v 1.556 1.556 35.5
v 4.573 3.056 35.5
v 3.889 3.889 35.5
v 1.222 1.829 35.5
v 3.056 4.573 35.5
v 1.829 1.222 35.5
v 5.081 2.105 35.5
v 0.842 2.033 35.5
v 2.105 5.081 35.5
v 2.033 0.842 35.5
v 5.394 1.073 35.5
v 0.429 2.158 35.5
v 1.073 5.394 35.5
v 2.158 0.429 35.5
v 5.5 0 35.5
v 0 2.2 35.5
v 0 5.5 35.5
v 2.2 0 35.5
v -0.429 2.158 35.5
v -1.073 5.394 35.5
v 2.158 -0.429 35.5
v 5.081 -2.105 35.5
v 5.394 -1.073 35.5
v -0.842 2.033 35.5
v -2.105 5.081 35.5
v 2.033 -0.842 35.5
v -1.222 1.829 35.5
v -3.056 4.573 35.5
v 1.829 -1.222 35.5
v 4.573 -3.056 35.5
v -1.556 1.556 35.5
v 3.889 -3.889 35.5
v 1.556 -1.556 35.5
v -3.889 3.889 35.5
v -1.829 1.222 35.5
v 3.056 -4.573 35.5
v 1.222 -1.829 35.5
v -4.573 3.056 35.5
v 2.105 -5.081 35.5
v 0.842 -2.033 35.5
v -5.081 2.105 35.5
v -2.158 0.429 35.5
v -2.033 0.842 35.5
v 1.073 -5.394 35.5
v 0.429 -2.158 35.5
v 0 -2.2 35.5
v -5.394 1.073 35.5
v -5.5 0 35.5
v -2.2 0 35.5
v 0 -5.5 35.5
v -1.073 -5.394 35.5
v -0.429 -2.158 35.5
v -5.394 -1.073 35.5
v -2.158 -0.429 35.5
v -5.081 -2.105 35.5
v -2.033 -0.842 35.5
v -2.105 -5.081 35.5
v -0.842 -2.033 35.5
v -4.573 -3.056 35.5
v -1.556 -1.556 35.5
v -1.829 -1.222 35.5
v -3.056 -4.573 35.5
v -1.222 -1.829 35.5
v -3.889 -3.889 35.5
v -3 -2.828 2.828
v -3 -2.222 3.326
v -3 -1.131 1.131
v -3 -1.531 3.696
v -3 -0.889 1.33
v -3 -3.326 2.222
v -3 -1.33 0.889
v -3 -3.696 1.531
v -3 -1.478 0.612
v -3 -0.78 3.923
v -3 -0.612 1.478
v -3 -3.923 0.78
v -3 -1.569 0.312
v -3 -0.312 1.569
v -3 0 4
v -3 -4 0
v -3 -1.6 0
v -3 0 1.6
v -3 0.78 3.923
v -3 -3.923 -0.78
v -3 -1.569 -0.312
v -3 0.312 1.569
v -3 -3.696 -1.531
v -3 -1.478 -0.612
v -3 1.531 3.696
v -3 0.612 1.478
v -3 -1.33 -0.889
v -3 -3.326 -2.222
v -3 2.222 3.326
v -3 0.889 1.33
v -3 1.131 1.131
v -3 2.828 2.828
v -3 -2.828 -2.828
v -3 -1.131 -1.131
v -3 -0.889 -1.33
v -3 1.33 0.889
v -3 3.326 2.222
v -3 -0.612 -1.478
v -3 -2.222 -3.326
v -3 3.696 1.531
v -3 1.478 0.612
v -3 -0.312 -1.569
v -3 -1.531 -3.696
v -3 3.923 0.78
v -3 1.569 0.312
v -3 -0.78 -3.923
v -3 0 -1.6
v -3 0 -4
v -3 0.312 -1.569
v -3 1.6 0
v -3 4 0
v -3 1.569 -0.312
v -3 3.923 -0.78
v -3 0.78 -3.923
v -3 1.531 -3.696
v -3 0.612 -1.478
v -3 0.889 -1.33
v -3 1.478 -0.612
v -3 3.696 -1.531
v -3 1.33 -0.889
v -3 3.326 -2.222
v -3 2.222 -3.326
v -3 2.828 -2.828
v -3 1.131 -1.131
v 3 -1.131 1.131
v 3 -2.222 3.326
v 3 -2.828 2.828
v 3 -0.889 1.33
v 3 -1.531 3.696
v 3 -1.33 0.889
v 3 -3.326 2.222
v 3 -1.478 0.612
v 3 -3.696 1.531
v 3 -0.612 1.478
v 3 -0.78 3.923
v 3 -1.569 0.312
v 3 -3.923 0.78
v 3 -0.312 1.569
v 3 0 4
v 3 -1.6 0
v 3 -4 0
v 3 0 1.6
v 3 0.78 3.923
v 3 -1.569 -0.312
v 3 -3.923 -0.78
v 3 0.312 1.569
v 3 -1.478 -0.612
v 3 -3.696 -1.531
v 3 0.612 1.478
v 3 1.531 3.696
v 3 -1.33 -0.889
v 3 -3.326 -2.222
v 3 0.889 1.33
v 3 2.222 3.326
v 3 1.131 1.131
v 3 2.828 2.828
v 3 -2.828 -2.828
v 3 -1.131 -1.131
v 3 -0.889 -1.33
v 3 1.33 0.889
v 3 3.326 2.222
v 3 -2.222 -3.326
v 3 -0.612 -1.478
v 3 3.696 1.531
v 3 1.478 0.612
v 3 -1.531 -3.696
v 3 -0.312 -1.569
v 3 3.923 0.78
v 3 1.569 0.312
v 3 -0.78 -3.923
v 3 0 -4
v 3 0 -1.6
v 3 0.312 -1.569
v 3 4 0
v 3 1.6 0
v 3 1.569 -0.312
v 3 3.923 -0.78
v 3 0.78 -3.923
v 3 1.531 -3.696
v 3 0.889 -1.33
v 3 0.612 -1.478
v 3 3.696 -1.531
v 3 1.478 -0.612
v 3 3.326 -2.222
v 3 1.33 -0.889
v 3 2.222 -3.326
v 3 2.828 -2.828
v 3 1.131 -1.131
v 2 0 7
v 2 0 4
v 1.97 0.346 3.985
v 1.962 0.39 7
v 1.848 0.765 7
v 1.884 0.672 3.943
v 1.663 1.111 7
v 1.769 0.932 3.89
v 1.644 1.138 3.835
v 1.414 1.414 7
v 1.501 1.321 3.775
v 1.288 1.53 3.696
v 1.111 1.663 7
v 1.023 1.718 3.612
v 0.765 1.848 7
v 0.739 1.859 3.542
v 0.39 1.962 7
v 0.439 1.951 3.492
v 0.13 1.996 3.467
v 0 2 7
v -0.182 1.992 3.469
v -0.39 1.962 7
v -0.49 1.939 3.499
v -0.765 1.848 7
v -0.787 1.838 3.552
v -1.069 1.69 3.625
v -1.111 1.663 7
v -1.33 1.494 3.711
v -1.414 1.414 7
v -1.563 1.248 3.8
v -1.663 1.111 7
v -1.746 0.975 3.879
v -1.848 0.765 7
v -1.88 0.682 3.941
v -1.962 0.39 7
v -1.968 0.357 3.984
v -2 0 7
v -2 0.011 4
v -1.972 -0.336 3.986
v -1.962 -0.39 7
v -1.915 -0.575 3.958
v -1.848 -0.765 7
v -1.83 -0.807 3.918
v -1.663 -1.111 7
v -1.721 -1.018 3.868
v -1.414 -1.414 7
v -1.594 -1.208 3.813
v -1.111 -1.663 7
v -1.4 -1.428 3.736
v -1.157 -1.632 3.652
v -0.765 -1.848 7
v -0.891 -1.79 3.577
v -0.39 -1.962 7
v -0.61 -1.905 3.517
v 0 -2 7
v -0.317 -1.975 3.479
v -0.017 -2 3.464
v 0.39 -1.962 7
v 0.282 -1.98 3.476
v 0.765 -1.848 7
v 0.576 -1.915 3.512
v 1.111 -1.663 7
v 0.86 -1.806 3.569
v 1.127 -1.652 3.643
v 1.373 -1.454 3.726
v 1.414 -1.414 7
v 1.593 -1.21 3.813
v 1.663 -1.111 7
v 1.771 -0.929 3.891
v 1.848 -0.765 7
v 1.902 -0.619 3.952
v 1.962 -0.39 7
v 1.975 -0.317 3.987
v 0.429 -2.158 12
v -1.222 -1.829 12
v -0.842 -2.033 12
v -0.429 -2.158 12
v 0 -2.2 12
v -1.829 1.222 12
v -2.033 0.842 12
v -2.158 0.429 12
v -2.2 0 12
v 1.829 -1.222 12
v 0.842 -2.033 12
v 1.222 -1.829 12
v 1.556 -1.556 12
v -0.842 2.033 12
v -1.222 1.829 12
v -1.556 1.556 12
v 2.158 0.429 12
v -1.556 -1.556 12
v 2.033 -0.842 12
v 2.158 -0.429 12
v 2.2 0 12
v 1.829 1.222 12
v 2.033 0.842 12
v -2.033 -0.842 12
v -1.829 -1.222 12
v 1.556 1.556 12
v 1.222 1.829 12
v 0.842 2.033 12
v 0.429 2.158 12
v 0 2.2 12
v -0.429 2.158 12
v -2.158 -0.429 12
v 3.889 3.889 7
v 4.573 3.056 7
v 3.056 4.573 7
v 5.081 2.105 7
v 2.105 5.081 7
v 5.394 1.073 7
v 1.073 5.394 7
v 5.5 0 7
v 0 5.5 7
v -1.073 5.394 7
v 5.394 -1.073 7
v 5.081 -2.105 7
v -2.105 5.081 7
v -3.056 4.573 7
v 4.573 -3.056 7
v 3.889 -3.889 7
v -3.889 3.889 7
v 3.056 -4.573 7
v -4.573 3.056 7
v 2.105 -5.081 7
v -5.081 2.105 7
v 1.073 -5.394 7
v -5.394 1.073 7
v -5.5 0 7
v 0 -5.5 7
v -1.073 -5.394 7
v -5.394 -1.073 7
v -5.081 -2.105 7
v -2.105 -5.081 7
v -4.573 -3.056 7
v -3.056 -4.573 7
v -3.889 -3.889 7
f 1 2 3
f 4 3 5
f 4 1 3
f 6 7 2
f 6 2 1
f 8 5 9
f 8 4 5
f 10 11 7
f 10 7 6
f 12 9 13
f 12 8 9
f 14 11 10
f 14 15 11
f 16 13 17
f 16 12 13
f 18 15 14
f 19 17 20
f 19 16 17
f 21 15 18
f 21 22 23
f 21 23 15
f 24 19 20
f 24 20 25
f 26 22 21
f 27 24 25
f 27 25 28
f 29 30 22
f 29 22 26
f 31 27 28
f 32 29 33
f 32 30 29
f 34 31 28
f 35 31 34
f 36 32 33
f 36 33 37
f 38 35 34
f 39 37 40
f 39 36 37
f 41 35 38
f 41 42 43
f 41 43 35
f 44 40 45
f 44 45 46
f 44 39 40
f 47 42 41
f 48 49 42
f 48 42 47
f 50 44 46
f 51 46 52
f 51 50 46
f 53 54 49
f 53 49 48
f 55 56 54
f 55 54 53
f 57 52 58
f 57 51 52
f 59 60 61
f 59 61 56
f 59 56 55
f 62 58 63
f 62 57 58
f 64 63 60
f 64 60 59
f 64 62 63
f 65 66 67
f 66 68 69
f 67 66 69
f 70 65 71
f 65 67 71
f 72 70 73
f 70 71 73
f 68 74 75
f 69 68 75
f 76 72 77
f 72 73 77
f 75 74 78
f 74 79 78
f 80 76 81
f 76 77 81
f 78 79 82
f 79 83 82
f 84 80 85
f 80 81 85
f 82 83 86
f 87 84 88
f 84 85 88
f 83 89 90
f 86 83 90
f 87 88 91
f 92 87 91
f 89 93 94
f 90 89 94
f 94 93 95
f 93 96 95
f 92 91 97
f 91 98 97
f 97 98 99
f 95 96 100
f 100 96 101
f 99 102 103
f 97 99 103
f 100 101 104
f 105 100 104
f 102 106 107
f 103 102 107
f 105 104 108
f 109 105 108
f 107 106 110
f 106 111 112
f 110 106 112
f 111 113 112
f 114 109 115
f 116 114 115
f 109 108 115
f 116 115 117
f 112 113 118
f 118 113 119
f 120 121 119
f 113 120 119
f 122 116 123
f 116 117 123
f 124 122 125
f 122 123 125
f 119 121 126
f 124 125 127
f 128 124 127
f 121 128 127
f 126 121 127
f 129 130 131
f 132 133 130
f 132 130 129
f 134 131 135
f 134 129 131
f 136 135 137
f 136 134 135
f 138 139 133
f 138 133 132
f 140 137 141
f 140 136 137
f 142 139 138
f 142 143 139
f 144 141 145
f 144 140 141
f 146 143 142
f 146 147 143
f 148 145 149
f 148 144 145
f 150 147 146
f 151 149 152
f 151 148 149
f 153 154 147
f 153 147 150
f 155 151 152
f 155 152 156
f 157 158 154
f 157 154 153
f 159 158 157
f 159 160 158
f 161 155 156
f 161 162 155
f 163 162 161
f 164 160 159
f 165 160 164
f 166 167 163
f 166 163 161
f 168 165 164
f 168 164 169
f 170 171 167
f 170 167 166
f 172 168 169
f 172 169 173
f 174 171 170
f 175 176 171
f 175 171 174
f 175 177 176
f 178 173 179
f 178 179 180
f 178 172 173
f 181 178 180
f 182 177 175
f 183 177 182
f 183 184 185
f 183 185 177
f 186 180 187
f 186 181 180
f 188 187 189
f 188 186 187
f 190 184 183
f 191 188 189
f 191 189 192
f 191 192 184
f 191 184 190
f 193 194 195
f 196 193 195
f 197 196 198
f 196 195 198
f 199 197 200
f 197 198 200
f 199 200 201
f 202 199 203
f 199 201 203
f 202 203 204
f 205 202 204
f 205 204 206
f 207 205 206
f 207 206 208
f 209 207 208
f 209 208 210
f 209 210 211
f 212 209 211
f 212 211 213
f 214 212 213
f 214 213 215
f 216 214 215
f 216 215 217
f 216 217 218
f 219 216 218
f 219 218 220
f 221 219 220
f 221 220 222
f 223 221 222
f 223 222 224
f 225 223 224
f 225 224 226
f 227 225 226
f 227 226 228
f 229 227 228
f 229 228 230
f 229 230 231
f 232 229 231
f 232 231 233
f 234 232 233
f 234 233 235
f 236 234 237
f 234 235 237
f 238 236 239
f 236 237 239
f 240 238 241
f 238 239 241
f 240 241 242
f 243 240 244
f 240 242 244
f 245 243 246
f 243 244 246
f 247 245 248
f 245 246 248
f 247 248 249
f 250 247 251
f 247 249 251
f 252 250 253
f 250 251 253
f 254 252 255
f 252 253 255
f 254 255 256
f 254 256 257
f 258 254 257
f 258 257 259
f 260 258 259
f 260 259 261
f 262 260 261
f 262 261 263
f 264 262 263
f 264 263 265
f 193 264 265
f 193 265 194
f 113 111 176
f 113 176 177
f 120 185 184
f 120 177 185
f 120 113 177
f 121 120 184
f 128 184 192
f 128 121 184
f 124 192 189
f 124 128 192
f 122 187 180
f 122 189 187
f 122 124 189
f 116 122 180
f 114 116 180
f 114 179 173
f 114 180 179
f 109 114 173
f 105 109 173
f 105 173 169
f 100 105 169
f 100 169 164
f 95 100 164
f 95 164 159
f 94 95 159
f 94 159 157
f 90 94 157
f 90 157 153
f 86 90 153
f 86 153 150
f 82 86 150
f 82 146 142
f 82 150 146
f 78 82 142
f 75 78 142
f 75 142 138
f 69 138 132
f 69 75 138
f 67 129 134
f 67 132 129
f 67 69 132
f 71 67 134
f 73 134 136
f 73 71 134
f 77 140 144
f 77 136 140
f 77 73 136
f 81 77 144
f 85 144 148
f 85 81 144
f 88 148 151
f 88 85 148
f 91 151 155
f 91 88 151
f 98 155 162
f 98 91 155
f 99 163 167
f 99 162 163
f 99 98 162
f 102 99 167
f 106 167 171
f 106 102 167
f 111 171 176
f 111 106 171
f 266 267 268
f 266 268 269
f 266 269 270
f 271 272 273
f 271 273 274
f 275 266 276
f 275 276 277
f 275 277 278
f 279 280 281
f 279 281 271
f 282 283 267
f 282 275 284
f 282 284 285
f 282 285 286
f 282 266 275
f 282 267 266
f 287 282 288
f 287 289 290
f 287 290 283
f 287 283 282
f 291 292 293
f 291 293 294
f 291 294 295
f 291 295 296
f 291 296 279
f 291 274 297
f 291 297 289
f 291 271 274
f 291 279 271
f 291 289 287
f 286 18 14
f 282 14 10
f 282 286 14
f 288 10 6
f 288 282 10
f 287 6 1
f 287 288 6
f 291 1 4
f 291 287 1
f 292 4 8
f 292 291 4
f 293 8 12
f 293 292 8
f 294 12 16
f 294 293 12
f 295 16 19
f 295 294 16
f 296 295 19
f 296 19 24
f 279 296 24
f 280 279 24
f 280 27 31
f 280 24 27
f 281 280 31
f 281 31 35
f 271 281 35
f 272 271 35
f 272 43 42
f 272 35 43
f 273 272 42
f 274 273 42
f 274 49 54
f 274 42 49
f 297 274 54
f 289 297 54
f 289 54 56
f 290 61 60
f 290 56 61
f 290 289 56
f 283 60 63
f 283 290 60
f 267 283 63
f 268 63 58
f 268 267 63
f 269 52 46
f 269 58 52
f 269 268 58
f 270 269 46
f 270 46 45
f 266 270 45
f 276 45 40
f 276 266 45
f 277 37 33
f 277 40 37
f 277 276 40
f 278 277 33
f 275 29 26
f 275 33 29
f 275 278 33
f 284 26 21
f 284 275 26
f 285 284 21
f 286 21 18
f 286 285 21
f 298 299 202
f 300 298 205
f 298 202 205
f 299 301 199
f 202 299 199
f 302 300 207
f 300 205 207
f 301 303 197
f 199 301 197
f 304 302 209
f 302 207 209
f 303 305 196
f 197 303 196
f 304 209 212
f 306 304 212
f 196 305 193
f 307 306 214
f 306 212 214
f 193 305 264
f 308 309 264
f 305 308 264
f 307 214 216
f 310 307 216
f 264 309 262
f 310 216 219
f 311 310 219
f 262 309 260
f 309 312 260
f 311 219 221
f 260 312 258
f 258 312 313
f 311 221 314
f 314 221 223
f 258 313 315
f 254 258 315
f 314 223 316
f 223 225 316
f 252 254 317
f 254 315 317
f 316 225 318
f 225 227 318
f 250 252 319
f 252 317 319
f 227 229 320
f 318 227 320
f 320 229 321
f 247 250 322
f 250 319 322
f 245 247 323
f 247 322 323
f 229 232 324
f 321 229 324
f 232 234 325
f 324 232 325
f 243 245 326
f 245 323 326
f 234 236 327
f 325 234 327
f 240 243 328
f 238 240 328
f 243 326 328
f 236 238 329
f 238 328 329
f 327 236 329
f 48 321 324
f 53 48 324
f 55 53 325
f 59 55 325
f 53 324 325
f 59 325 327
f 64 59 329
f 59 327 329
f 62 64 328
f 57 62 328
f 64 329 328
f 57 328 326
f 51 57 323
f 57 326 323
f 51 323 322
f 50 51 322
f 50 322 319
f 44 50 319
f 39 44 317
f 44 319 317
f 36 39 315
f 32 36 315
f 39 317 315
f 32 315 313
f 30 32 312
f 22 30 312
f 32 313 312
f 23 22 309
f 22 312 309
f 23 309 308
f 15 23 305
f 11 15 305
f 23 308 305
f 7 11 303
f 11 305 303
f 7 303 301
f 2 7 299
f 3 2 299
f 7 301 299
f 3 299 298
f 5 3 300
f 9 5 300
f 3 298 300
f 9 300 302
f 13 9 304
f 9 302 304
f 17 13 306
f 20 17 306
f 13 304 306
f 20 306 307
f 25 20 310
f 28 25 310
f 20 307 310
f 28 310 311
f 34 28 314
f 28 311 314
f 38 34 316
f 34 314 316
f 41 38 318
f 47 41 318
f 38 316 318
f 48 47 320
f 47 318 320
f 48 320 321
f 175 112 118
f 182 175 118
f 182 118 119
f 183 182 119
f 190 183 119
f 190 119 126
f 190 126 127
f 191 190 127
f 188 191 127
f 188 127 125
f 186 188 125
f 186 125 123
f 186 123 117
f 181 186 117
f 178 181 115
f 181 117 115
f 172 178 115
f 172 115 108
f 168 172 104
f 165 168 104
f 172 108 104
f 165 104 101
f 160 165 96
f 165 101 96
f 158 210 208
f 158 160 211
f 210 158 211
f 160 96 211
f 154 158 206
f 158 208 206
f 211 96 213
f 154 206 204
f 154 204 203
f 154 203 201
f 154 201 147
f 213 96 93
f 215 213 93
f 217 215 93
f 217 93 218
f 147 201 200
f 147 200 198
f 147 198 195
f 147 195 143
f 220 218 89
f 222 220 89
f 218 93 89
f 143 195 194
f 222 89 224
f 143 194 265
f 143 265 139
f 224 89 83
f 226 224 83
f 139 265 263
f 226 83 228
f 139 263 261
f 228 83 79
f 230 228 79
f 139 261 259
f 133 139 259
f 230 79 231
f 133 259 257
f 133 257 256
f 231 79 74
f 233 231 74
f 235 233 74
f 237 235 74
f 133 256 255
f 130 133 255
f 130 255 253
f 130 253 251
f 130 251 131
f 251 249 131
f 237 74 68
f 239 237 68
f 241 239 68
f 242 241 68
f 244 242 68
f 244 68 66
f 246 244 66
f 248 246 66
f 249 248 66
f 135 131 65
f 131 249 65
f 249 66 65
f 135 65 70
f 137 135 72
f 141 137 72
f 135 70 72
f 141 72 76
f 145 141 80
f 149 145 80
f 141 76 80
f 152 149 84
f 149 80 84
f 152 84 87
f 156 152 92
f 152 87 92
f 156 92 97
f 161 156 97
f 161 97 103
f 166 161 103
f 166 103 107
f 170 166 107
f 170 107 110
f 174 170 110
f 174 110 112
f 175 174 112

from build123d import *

# Parameters (mm, degrees)
F_0000_CYLINDER_SKETCH_R     = 5.5
F_0000_CYLINDER_DEPTH        = 28.5
F_0002_CYLINDER_SKETCH_R     = 2.2
F_0002_CYLINDER_DEPTH        = 24.5
F_0005_CYLINDER_SKETCH_R     = 2
F_0005_CYLINDER_DEPTH        = 6
F_0008_CYLINDER_SKETCH_R     = 4
F_0008_CYLINDER_DEPTH        = 6
F_0008_CYLINDER_ROTATE_ANGLE = 90
F_0010_CYLINDER_SKETCH_R     = 1.6
F_0010_CYLINDER_DEPTH        = 8
F_0010_CYLINDER_ROTATE_ANGLE = 90


with BuildPart() as part:
    # 0000_cylinder_Sketch → 0000_cylinder (new body)
    with BuildSketch(Plane.XY):
        with Locations(Location((0, 0, 0), (0, 0, 180))):
            Circle(F_0000_CYLINDER_SKETCH_R)
    extrude(amount=F_0000_CYLINDER_DEPTH)


with BuildPart() as part_1:
    # 0000_cylinder_Translate: moved
    add(part.part.moved(Location((0, 0, 7))))


with BuildPart() as body_2:
    # 0002_cylinder_Sketch → 0002_cylinder (new body)
    with BuildSketch(Plane.XY):
        Circle(F_0002_CYLINDER_SKETCH_R)
    extrude(amount=F_0002_CYLINDER_DEPTH)


with BuildPart() as body_2_1:
    # 0002_cylinder_Translate: moved
    add(body_2.part.moved(Location((0, 0, 12))))


with BuildPart() as part_2:
    add(part_1.part)

    # 0004_sub: cut body 2
    add(body_2_1.part, mode=Mode.SUBTRACT)


with BuildPart() as body_2_2:
    # 0005_cylinder_Sketch → 0005_cylinder (new body)
    with BuildSketch(Plane.XY):
        Circle(F_0005_CYLINDER_SKETCH_R)
    extrude(amount=F_0005_CYLINDER_DEPTH)


with BuildPart() as body_2_2_1:
    # 0005_cylinder_Translate: moved
    add(body_2_2.part.moved(Location((0, 0, 3))))


with BuildPart() as part_3:
    add(part_2.part)

    # 0007_add: union body 2 2
    add(body_2_2_1.part)


with BuildPart() as body_2_3:
    # 0008_cylinder_Sketch → 0008_cylinder (new body)
    with BuildSketch(Plane.XY):
        Circle(F_0008_CYLINDER_SKETCH_R)
    extrude(amount=F_0008_CYLINDER_DEPTH)


with BuildPart() as body_2_3_1:
    # 0008_cylinder_Rotate: moved
    add(body_2_3.part.rotate(Axis((0, 0, 0), (0, 1, 0)), F_0008_CYLINDER_ROTATE_ANGLE))


with BuildPart() as body_2_3_2:
    # 0008_cylinder_Translate: moved
    add(body_2_3_1.part.moved(Location((-3, 0, 0))))


with BuildPart() as part_4:
    add(part_3.part)

    # 0009_add: union body 2 3
    add(body_2_3_2.part)


with BuildPart() as body_2_4:
    # 0010_cylinder_Sketch → 0010_cylinder (new body)
    with BuildSketch(Plane.XY):
        Circle(F_0010_CYLINDER_SKETCH_R)
    extrude(amount=F_0010_CYLINDER_DEPTH)


with BuildPart() as body_2_4_1:
    # 0010_cylinder_Rotate: moved
    add(body_2_4.part.rotate(Axis((0, 0, 0), (0, 1, 0)), F_0010_CYLINDER_ROTATE_ANGLE))


with BuildPart() as body_2_4_2:
    # 0010_cylinder_Translate: moved
    add(body_2_4_1.part.moved(Location((-4, 0, 0))))


with BuildPart() as part_5:
    add(part_4.part)

    # 0011_sub: cut body 2 4
    add(body_2_4_2.part, mode=Mode.SUBTRACT)


solid = part_5.part
